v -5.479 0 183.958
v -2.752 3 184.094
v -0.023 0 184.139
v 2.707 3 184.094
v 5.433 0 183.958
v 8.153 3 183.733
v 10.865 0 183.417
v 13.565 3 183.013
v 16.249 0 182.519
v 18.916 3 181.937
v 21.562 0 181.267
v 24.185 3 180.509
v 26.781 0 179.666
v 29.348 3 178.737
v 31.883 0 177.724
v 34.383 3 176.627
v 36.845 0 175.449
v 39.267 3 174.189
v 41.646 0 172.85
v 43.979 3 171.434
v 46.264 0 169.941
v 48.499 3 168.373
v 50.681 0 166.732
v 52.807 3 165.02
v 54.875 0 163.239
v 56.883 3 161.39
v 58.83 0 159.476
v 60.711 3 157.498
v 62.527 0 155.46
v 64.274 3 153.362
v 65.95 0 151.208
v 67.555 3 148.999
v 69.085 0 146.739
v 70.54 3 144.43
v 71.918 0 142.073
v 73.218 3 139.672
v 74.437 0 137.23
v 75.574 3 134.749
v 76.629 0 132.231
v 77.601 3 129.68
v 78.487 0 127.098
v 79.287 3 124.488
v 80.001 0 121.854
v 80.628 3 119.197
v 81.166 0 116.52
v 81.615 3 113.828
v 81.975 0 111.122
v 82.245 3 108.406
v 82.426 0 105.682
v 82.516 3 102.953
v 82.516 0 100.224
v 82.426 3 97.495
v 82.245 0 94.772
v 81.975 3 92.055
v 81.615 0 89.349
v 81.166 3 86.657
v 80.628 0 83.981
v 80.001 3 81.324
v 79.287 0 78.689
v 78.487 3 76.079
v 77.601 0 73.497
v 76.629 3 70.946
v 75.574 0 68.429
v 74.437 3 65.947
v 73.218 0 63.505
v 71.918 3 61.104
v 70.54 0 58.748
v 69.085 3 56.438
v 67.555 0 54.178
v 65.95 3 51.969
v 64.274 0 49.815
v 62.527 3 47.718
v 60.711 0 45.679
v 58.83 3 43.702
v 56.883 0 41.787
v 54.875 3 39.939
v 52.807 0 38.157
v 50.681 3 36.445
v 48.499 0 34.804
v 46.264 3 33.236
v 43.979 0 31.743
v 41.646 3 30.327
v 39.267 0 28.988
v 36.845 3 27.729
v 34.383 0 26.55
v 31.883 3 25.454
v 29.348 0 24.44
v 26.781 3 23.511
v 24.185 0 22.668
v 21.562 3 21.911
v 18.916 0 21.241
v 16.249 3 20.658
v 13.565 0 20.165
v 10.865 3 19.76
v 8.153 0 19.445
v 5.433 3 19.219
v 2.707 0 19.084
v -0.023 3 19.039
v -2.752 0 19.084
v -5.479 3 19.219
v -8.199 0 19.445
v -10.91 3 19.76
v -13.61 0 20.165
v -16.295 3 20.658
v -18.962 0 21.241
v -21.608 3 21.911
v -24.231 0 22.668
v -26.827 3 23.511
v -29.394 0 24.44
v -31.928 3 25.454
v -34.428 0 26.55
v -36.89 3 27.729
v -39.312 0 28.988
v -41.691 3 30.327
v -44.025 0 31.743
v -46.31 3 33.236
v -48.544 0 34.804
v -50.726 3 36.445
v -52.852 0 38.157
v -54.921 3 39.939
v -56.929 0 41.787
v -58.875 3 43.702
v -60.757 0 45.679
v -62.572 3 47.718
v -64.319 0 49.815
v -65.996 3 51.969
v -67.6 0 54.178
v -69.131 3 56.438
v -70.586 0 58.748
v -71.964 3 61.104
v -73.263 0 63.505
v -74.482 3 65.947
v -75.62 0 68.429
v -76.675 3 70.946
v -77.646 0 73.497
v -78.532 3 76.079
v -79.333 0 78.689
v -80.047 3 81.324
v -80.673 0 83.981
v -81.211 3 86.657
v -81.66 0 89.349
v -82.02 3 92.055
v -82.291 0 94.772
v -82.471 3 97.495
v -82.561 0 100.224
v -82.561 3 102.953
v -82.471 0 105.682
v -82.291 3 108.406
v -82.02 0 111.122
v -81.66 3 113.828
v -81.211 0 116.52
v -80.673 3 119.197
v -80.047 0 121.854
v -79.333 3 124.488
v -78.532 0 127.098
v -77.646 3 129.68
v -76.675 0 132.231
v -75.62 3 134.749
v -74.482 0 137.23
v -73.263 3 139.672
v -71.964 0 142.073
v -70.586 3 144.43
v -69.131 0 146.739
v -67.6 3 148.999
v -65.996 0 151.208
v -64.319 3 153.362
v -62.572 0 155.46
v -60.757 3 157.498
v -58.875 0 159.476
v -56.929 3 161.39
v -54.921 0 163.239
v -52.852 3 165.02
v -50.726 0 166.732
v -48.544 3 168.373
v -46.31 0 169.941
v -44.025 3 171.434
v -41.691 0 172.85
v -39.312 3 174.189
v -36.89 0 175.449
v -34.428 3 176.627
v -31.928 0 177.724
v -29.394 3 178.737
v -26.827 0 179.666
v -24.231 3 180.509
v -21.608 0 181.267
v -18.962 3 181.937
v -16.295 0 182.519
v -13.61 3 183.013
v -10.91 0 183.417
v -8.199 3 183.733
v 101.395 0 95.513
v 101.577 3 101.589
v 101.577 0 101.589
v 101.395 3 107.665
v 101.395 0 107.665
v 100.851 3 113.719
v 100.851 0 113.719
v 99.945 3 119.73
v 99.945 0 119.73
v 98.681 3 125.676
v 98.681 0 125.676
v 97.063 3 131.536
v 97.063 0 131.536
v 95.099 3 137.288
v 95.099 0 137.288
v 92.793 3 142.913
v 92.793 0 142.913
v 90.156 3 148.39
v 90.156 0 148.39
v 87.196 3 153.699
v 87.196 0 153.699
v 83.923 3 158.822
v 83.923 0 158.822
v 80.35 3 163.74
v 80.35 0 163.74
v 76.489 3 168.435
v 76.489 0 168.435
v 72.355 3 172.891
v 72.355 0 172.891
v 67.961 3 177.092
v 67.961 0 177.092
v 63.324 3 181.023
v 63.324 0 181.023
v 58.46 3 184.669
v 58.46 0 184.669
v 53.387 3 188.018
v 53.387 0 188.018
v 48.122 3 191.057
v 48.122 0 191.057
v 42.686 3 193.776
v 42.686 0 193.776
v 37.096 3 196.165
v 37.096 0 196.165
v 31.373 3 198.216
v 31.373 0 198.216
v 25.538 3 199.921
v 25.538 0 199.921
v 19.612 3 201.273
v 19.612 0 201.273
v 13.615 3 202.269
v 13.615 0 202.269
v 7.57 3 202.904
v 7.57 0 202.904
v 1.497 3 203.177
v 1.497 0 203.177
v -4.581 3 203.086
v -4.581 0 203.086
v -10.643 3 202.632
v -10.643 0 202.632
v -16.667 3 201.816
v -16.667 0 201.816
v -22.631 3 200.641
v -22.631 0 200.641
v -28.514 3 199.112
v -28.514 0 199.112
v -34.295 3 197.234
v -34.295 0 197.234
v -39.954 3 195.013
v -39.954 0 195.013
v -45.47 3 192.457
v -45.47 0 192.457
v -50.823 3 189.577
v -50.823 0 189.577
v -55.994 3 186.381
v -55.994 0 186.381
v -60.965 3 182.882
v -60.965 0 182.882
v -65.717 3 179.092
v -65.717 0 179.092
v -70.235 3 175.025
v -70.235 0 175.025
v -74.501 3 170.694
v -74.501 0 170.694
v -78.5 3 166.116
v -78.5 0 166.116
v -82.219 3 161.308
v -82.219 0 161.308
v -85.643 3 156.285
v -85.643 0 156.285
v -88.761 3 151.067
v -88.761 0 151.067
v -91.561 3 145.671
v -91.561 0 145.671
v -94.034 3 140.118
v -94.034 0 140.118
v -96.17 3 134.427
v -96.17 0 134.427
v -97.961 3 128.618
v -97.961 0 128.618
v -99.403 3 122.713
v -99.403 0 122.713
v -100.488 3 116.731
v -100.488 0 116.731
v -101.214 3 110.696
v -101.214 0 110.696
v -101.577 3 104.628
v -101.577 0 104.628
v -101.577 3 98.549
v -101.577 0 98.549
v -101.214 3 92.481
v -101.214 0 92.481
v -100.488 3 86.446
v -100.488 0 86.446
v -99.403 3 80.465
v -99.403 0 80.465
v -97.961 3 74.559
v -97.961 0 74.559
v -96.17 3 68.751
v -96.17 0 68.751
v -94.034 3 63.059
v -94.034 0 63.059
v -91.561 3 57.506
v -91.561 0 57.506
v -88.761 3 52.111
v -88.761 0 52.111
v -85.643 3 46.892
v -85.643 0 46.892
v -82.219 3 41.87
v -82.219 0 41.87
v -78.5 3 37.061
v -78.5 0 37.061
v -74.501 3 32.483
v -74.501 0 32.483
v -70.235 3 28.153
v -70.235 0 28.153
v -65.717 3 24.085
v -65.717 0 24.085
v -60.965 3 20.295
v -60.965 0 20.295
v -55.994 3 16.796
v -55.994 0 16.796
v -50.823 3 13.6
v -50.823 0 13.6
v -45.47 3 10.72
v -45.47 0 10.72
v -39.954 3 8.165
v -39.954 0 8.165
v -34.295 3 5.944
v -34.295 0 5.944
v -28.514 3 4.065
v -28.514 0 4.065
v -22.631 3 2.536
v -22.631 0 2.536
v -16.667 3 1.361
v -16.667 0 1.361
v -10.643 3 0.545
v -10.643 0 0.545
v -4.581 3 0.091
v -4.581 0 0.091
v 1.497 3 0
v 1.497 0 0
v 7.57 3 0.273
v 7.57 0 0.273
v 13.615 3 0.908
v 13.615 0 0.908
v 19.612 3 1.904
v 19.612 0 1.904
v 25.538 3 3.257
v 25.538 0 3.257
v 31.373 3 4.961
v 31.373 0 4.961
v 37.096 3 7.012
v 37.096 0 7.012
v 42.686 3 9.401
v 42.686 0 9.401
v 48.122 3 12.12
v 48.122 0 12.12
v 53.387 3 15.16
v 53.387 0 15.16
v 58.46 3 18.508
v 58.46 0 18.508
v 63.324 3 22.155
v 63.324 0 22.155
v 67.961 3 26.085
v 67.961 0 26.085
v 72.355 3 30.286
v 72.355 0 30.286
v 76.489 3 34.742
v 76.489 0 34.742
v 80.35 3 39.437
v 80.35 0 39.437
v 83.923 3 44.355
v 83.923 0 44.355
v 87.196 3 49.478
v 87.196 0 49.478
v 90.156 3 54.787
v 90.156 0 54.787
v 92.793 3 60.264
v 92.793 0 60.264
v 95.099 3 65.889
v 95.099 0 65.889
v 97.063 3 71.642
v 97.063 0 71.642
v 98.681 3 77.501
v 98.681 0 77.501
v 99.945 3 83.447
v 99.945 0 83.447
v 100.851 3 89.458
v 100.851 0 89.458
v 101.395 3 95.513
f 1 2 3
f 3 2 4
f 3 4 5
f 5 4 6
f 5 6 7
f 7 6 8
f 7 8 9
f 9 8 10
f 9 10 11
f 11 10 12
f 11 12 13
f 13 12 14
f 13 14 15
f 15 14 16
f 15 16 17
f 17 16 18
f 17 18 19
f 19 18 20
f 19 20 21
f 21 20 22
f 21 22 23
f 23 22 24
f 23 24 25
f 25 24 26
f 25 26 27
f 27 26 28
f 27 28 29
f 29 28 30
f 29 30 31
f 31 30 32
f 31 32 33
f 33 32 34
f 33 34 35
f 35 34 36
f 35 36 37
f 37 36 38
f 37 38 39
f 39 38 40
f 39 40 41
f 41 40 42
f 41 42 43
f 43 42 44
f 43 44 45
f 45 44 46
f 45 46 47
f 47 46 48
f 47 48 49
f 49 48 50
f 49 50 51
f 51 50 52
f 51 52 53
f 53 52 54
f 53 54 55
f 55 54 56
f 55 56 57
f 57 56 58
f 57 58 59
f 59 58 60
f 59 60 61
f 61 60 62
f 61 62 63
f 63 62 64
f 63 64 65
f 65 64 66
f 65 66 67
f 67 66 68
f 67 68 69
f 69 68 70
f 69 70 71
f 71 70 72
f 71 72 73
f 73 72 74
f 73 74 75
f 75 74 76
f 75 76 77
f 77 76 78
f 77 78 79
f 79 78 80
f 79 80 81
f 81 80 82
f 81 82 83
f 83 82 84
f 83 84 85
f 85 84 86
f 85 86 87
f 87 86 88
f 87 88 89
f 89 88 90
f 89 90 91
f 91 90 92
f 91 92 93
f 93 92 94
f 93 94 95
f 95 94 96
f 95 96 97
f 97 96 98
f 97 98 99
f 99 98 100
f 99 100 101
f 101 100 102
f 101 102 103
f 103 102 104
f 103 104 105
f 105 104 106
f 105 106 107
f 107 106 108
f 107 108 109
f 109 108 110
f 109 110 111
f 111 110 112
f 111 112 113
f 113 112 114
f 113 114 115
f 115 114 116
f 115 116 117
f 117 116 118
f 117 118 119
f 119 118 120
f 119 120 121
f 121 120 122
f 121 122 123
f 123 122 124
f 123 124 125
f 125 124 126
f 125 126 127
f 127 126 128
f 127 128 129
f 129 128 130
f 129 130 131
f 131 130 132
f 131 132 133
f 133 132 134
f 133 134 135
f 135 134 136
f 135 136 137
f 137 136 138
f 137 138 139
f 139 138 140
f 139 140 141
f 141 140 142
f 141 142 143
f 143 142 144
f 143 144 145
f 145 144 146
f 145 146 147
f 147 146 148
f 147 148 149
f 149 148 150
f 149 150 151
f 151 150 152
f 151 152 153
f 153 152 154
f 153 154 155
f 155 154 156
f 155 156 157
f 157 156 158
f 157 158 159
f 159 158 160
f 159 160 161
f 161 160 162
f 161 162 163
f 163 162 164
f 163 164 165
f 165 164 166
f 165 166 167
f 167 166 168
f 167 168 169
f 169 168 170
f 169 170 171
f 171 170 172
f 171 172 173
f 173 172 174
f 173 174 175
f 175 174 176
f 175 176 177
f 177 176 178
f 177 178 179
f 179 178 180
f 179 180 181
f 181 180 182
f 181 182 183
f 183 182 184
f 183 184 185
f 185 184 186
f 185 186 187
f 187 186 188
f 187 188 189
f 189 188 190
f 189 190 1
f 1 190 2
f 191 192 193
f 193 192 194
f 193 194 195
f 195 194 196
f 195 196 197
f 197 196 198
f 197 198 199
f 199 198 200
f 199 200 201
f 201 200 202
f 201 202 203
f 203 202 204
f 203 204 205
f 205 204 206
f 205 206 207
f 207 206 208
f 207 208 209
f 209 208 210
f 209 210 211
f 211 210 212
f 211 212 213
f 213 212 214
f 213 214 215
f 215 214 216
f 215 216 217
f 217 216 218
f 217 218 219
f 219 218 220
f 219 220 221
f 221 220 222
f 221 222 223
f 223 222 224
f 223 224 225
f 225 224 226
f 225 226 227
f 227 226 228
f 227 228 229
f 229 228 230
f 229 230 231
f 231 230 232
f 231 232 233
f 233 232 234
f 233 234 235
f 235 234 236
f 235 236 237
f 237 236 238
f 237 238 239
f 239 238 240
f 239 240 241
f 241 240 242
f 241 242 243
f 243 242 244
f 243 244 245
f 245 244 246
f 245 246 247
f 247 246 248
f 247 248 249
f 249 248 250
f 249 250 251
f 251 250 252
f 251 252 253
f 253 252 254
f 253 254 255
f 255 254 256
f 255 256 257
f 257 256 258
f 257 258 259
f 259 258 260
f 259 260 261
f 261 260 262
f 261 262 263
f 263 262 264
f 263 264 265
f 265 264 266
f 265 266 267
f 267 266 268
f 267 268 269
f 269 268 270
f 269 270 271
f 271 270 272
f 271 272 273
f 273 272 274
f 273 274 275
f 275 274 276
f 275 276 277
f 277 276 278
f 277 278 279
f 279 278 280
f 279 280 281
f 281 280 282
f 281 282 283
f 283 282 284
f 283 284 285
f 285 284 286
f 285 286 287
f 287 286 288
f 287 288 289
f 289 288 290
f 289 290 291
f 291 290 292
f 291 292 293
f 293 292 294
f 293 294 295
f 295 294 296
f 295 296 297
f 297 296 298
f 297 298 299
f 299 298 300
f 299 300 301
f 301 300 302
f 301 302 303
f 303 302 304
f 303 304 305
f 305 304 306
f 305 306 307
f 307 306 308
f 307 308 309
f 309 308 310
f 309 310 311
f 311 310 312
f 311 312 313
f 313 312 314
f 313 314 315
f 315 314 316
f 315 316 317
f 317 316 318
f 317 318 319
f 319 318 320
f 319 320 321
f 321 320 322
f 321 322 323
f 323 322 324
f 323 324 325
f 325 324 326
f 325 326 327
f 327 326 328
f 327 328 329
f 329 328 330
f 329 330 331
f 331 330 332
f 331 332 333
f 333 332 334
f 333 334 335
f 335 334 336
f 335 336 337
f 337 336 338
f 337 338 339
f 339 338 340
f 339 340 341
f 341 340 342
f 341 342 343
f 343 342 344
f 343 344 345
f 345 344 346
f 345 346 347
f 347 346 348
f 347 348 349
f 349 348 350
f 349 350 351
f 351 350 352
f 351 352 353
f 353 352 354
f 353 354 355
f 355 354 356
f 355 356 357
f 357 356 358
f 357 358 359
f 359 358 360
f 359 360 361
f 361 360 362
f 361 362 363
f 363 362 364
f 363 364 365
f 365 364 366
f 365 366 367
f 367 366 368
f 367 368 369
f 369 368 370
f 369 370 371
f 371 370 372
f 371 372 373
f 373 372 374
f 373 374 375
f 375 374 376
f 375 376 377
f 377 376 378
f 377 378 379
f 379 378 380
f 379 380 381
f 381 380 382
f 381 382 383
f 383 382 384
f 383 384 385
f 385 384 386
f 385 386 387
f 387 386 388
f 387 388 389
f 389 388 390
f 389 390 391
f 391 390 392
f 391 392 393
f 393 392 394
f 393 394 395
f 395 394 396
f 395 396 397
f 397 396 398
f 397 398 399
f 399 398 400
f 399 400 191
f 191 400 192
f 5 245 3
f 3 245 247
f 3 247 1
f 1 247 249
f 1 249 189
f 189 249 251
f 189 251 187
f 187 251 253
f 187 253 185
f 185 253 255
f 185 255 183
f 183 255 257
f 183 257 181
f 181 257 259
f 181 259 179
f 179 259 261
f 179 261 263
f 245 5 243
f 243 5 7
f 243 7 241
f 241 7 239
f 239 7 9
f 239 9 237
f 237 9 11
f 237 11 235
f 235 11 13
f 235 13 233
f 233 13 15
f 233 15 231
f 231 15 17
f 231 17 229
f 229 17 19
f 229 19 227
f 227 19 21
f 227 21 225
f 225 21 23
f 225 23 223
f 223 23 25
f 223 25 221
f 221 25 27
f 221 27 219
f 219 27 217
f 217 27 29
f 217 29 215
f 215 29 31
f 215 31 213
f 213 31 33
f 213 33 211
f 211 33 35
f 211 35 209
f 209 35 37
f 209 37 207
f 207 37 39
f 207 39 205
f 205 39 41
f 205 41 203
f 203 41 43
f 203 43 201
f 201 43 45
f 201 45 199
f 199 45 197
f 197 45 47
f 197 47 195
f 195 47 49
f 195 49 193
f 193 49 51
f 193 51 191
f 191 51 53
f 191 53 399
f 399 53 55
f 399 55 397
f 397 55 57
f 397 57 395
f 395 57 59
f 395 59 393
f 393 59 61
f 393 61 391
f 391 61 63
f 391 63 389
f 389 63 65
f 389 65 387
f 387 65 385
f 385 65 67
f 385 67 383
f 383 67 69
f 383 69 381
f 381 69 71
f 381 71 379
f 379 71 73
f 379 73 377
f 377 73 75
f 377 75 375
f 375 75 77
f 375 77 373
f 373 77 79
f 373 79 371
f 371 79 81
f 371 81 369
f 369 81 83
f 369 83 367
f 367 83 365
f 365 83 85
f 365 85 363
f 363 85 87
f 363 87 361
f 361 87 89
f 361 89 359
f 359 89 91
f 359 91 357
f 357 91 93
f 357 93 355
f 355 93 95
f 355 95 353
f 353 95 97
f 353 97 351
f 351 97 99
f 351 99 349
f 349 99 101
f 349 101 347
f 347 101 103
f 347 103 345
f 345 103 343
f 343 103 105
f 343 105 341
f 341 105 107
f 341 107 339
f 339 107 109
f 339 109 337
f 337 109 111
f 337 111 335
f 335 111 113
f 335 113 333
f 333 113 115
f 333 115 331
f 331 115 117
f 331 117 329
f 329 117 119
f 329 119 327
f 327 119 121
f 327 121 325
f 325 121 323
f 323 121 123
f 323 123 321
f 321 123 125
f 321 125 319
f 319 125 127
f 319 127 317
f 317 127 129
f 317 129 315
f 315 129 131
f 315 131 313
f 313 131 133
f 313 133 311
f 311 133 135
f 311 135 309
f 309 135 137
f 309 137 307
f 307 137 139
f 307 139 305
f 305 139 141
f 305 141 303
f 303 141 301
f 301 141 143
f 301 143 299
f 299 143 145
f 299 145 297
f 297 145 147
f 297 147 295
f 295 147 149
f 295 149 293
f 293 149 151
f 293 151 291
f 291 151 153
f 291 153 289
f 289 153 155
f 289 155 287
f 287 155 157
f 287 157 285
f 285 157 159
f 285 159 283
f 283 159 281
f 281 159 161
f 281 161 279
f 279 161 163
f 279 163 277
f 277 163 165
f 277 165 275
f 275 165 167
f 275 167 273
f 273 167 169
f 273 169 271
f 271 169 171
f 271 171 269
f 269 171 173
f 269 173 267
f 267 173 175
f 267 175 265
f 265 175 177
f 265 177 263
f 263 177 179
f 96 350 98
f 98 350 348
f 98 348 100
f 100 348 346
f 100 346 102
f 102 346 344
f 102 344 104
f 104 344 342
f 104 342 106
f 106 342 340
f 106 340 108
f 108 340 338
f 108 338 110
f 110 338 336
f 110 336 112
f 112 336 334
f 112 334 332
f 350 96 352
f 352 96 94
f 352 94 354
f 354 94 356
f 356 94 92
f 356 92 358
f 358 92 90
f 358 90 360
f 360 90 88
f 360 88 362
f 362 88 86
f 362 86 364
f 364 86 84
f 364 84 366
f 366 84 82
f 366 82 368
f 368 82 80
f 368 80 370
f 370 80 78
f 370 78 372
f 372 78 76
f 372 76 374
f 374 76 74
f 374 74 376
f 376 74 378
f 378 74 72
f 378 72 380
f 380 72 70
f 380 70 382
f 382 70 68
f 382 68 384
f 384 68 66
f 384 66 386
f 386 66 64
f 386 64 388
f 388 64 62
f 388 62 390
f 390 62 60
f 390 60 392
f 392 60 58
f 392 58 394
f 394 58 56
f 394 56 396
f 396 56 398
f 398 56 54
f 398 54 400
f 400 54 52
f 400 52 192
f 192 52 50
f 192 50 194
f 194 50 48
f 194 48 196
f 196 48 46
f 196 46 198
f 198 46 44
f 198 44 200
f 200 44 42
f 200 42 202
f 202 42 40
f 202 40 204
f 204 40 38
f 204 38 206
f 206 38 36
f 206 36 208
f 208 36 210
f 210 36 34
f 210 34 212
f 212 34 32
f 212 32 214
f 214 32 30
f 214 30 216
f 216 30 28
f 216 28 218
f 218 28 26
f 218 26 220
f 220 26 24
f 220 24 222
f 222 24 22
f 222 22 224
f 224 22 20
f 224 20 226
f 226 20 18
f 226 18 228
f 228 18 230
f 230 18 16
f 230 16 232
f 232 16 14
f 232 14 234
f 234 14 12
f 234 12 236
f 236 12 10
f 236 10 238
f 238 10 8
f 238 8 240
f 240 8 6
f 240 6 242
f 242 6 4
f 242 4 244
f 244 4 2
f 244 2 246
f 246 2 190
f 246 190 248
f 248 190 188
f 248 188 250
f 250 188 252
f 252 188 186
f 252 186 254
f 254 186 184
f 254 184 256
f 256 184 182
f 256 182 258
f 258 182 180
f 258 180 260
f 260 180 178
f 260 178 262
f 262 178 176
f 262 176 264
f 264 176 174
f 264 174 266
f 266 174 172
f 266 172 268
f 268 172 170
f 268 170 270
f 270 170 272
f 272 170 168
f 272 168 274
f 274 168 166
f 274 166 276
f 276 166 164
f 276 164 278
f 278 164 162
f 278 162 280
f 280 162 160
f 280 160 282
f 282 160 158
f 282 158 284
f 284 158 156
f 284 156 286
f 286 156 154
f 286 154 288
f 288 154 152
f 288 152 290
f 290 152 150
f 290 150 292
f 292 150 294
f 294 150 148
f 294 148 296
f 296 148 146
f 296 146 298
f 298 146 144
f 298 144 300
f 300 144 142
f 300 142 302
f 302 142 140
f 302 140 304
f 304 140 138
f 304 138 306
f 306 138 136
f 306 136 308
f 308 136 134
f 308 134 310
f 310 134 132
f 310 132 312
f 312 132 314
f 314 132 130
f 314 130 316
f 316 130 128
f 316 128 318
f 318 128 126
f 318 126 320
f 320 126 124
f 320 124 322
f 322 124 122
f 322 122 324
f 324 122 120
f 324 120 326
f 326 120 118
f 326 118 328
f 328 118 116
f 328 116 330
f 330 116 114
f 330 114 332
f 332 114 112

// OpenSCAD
module stlObject1() {polyhedron(
 points=[
   [-0.0227356,0,184.1386],
   [-2.752117,3,184.0935],
   [-5.478513,0,183.9581],
   [2.706645,3,184.0935],
   [5.433042,0,183.9581],
   [8.153473,3,183.7327],
   [10.86496,0,183.4175],
   [13.56455,3,183.0128],
   [16.24928,0,182.519],
   [18.91621,3,181.9367],
   [21.56243,0,181.2666],
   [24.18505,3,180.5094],
   [26.78121,0,179.6658],
   [29.34805,3,178.7369],
   [31.88277,0,177.7236],
   [34.38261,3,176.6271],
   [36.84482,0,175.4485],
   [39.26672,3,174.1892],
   [41.64566,0,172.8505],
   [43.97903,3,171.4338],
   [46.26429,0,169.9408],
   [48.49894,3,168.373],
   [50.68052,0,166.7322],
   [52.80667,3,165.0201],
   [54.87504,0,163.2387],
   [56.88339,3,161.3899],
   [58.82951,0,159.4757],
   [60.71127,3,157.4982],
   [62.52663,0,155.4596],
   [64.27358,3,153.362],
   [65.95023,0,151.2079],
   [67.55474,3,148.9995],
   [69.08536,0,146.7392],
   [70.54041,3,144.4296],
   [71.91829,0,142.0731],
   [73.21751,3,139.6723],
   [74.43664,0,137.23],
   [75.57436,3,134.7486],
   [76.6294,0,132.231],
   [77.60063,3,129.6798],
   [78.48698,0,127.098],
   [79.28748,3,124.4882],
   [80.00126,0,121.8535],
   [80.62753,3,119.1965],
   [81.16561,0,116.5203],
   [81.61491,3,113.8278],
   [81.97495,0,111.1219],
   [82.24532,3,108.4056],
   [82.42573,0,105.6818],
   [82.51598,3,102.9535],
   [82.51598,0,100.2238],
   [82.42573,3,97.49549],
   [82.24532,0,94.77171],
   [81.97495,3,92.05537],
   [81.61491,0,89.34947],
   [81.16561,3,86.65694],
   [80.62753,0,83.98075],
   [80.00126,3,81.3238],
   [79.28748,0,78.68902],
   [78.48698,3,76.07928],
   [77.60063,0,73.49743],
   [76.6294,3,70.9463],
   [75.57436,0,68.42867],
   [74.43664,3,65.94731],
   [73.21751,0,63.50492],
   [71.91829,3,61.10417],
   [70.54041,0,58.74769],
   [69.08536,3,56.43806],
   [67.55474,0,54.1778],
   [65.95023,3,51.96938],
   [64.27358,0,49.81522],
   [62.52663,3,47.71767],
   [60.71127,0,45.67904],
   [58.82951,3,43.70153],
   [56.88339,0,41.78733],
   [54.87504,3,39.93852],
   [52.80667,0,38.15712],
   [50.68052,3,36.44508],
   [48.49894,0,34.80428],
   [46.26429,3,33.2365],
   [43.97903,0,31.74347],
   [41.64566,3,30.32681],
   [39.26672,0,28.98808],
   [36.84482,3,27.72872],
   [34.38261,0,26.55014],
   [31.88277,3,25.45361],
   [29.34805,0,24.44033],
   [26.78121,3,23.51141],
   [24.18505,0,22.66788],
   [21.56243,3,21.91064],
   [18.91621,0,21.24052],
   [16.24928,3,20.65826],
   [13.56455,0,20.16451],
   [10.86496,3,19.75978],
   [8.153473,0,19.44453],
   [5.433042,3,19.21912],
   [2.706645,0,19.08376],
   [-0.0227356,3,19.03863],
   [-2.752117,0,19.08376],
   [-5.478513,3,19.21912],
   [-8.198944,0,19.44453],
   [-10.91043,3,19.75978],
   [-13.61002,0,20.16451],
   [-16.29475,3,20.65826],
   [-18.96168,0,21.24052],
   [-21.6079,3,21.91064],
   [-24.23053,0,22.66788],
   [-26.82668,3,23.51141],
   [-29.39352,0,24.44033],
   [-31.92824,3,25.45361],
   [-34.42808,0,26.55014],
   [-36.89029,3,27.72872],
   [-39.31219,0,28.98808],
   [-41.69113,3,30.32681],
   [-44.02451,0,31.74347],
   [-46.30976,3,33.2365],
   [-48.54441,0,34.80428],
   [-50.72599,3,36.44508],
   [-52.85214,0,38.15712],
   [-54.92051,3,39.93852],
   [-56.92886,0,41.78733],
   [-58.87498,3,43.70153],
   [-60.75674,0,45.67904],
   [-62.5721,3,47.71767],
   [-64.31905,0,49.81522],
   [-65.9957,3,51.96938],
   [-67.60021,0,54.1778],
   [-69.13083,3,56.43806],
   [-70.58588,0,58.74769],
   [-71.96376,3,61.10417],
   [-73.26298,0,63.50492],
   [-74.48211,3,65.94731],
   [-75.61983,0,68.42867],
   [-76.67487,3,70.9463],
   [-77.6461,0,73.49743],
   [-78.53245,3,76.07928],
   [-79.33295,0,78.68902],
   [-80.04673,3,81.3238],
   [-80.673,0,83.98075],
   [-81.21108,3,86.65694],
   [-81.66039,0,89.34947],
   [-82.02042,3,92.05537],
   [-82.29079,0,94.77171],
   [-82.4712,3,97.49549],
   [-82.56145,0,100.2238],
   [-82.56145,3,102.9535],
   [-82.4712,0,105.6818],
   [-82.29079,3,108.4056],
   [-82.02042,0,111.1219],
   [-81.66039,3,113.8278],
   [-81.21108,0,116.5203],
   [-80.673,3,119.1965],
   [-80.04673,0,121.8535],
   [-79.33295,3,124.4882],
   [-78.53245,0,127.098],
   [-77.6461,3,129.6798],
   [-76.67487,0,132.231],
   [-75.61983,3,134.7486],
   [-74.48211,0,137.23],
   [-73.26298,3,139.6723],
   [-71.96376,0,142.0731],
   [-70.58588,3,144.4296],
   [-69.13083,0,146.7392],
   [-67.60021,3,148.9995],
   [-65.9957,0,151.2079],
   [-64.31905,3,153.362],
   [-62.5721,0,155.4596],
   [-60.75674,3,157.4982],
   [-58.87498,0,159.4757],
   [-56.92886,3,161.3899],
   [-54.92051,0,163.2387],
   [-52.85214,3,165.0201],
   [-50.72599,0,166.7322],
   [-48.54441,3,168.373],
   [-46.30976,0,169.9408],
   [-44.02451,3,171.4338],
   [-41.69113,0,172.8505],
   [-39.31219,3,174.1892],
   [-36.89029,0,175.4485],
   [-34.42808,3,176.6271],
   [-31.92824,0,177.7236],
   [-29.39352,3,178.7369],
   [-26.82668,0,179.6658],
   [-24.23053,3,180.5094],
   [-21.6079,0,181.2666],
   [-18.96168,3,181.9367],
   [-16.29475,0,182.519],
   [-13.61002,3,183.0128],
   [-10.91043,0,183.4175],
   [-8.198944,3,183.7327],
   [101.5773,0,101.5886],
   [101.5773,3,101.5886],
   [101.3954,0,95.51253],
   [101.3954,3,107.6647],
   [101.3954,0,107.6647],
   [100.8505,3,113.7191],
   [100.8505,0,113.7191],
   [99.94451,3,119.73],
   [99.94451,0,119.73],
   [98.68065,3,125.676],
   [98.68065,0,125.676],
   [97.06346,3,131.5358],
   [97.06346,0,131.5358],
   [95.09872,3,137.2883],
   [95.09872,0,137.2883],
   [92.79348,3,142.9131],
   [92.79348,0,142.9131],
   [90.15598,3,148.3899],
   [90.15598,0,148.3899],
   [87.19566,3,153.6992],
   [87.19566,0,153.6992],
   [83.92313,3,158.8219],
   [83.92313,0,158.8219],
   [80.35008,3,163.7398],
   [80.35008,0,163.7398],
   [76.48933,3,168.4352],
   [76.48933,0,168.4352],
   [72.35468,3,172.8913],
   [72.35468,0,172.8913],
   [67.96094,3,177.0921],
   [67.96094,0,177.0921],
   [63.32383,3,181.0227],
   [63.32383,0,181.0227],
   [58.45996,3,184.6689],
   [58.45996,0,184.6689],
   [53.38673,3,188.0177],
   [53.38673,0,188.0177],
   [48.12232,3,191.0571],
   [48.12232,0,191.0571],
   [42.68556,3,193.7763],
   [42.68556,0,193.7763],
   [37.09591,3,196.1654],
   [37.09591,0,196.1654],
   [31.37339,3,198.216],
   [31.37339,0,198.216],
   [25.53848,3,199.9206],
   [25.53848,0,199.9206],
   [19.61207,3,201.2733],
   [19.61207,0,201.2733],
   [13.61536,3,202.2691],
   [13.61536,0,202.2691],
   [7.569842,3,202.9045],
   [7.569842,0,202.9045],
   [1.49714,3,203.1773],
   [1.49714,0,203.1773],
   [-4.581002,3,203.0863],
   [-4.581002,0,203.0863],
   [-10.64283,3,202.6321],
   [-10.64283,0,202.6321],
   [-16.66664,3,201.8161],
   [-16.66664,0,201.8161],
   [-22.63086,3,200.6413],
   [-22.63086,0,200.6413],
   [-28.51416,3,199.112],
   [-28.51416,0,199.112],
   [-34.29546,3,197.2335],
   [-34.29546,0,197.2335],
   [-39.95408,3,195.0126],
   [-39.95408,0,195.0126],
   [-45.46975,3,192.4574],
   [-45.46975,0,192.4574],
   [-50.82273,3,189.5768],
   [-50.82273,0,189.5768],
   [-55.99387,3,186.3813],
   [-55.99387,0,186.3813],
   [-60.96464,3,182.8822],
   [-60.96464,0,182.8822],
   [-65.71725,3,179.0921],
   [-65.71725,0,179.0921],
   [-70.2347,3,175.0246],
   [-70.2347,0,175.0246],
   [-74.50081,3,170.6942],
   [-74.50081,0,170.6942],
   [-78.5003,3,166.1164],
   [-78.5003,0,166.1164],
   [-82.21886,3,161.3076],
   [-82.21886,0,161.3076],
   [-85.64319,3,156.2851],
   [-85.64319,0,156.2851],
   [-88.76101,3,151.0667],
   [-88.76101,0,151.0667],
   [-91.56117,3,145.6712],
   [-91.56117,0,145.6712],
   [-94.03365,3,140.1179],
   [-94.03365,0,140.1179],
   [-96.1696,3,134.4267],
   [-96.1696,0,134.4267],
   [-97.96136,3,128.618],
   [-97.96136,0,128.618],
   [-99.40253,3,122.7125],
   [-99.40253,0,122.7125],
   [-100.4879,3,116.7313],
   [-100.4879,0,116.7313],
   [-101.2137,3,110.696],
   [-101.2137,0,110.696],
   [-101.5773,3,104.628],
   [-101.5773,0,104.628],
   [-101.5773,3,98.54922],
   [-101.5773,0,98.54922],
   [-101.2137,3,92.48128],
   [-101.2137,0,92.48128],
   [-100.4879,3,86.44594],
   [-100.4879,0,86.44594],
   [-99.40253,3,80.4648],
   [-99.40253,0,80.4648],
   [-97.96136,3,74.55929],
   [-97.96136,0,74.55929],
   [-96.1696,3,68.75053],
   [-96.1696,0,68.75053],
   [-94.03365,3,63.05932],
   [-94.03365,0,63.05932],
   [-91.56117,3,57.50604],
   [-91.56117,0,57.50604],
   [-88.76101,3,52.11057],
   [-88.76101,0,52.11057],
   [-85.64319,3,46.89221],
   [-85.64319,0,46.89221],
   [-82.21886,3,41.86965],
   [-82.21886,0,41.86965],
   [-78.5003,3,37.06087],
   [-78.5003,0,37.06087],
   [-74.50081,3,32.48308],
   [-74.50081,0,32.48308],
   [-70.2347,3,28.15267],
   [-70.2347,0,28.15267],
   [-65.71725,3,24.08514],
   [-65.71725,0,24.08514],
   [-60.96464,3,20.29506],
   [-60.96464,0,20.29506],
   [-55.99387,3,16.79599],
   [-55.99387,0,16.79599],
   [-50.82273,3,13.60045],
   [-50.82273,0,13.60045],
   [-45.46975,3,10.71989],
   [-45.46975,0,10.71989],
   [-39.95408,3,8.164612],
   [-39.95408,0,8.164612],
   [-34.29546,3,5.943764],
   [-34.29546,0,5.943764],
   [-28.51416,3,4.065308],
   [-28.51416,0,4.065308],
   [-22.63086,3,2.535957],
   [-22.63086,0,2.535957],
   [-16.66664,3,1.361183],
   [-16.66664,0,1.361183],
   [-10.64283,3,0.5452042],
   [-10.64283,0,0.5452042],
   [-4.581002,3,0.09093475],
   [-4.581002,0,0.09093475],
   [1.49714,3,0],
   [1.49714,0,0],
   [7.569842,3,0.272728],
   [7.569842,0,0.272728],
   [13.61536,3,0.9081345],
   [13.61536,0,0.9081345],
   [19.61207,3,1.903954],
   [19.61207,0,1.903954],
   [25.53848,3,3.256622],
   [25.53848,0,3.256622],
   [31.37339,3,4.961288],
   [31.37339,0,4.961288],
   [37.09591,3,7.011856],
   [37.09591,0,7.011856],
   [42.68556,3,9.400986],
   [42.68556,0,9.400986],
   [48.12232,3,12.12012],
   [48.12232,0,12.12012],
   [53.38673,3,15.15954],
   [53.38673,0,15.15954],
   [58.45996,3,18.50834],
   [58.45996,0,18.50834],
   [63.32383,3,22.15455],
   [63.32383,0,22.15455],
   [67.96094,3,26.08511],
   [67.96094,0,26.08511],
   [72.35468,3,30.28596],
   [72.35468,0,30.28596],
   [76.48933,3,34.74206],
   [76.48933,0,34.74206],
   [80.35008,3,39.43744],
   [80.35008,0,39.43744],
   [83.92313,3,44.35531],
   [83.92313,0,44.35531],
   [87.19566,3,49.47807],
   [87.19566,0,49.47807],
   [90.15598,3,54.78736],
   [90.15598,0,54.78736],
   [92.79348,3,60.26419],
   [92.79348,0,60.26419],
   [95.09872,3,65.88895],
   [95.09872,0,65.88895],
   [97.06346,3,71.6415],
   [97.06346,0,71.6415],
   [98.68065,3,77.50126],
   [98.68065,0,77.50126],
   [99.94451,3,83.44725],
   [99.94451,0,83.44725],
   [100.8505,3,89.45818],
   [100.8505,0,89.45818],
   [101.3954,3,95.51253],
 ],
 faces=[
  [0,1,2,],
  [3,1,0,],
  [4,3,0,],
  [5,3,4,],
  [6,5,4,],
  [7,5,6,],
  [8,7,6,],
  [9,7,8,],
  [10,9,8,],
  [11,9,10,],
  [12,11,10,],
  [13,11,12,],
  [14,13,12,],
  [15,13,14,],
  [16,15,14,],
  [17,15,16,],
  [18,17,16,],
  [19,17,18,],
  [20,19,18,],
  [21,19,20,],
  [22,21,20,],
  [23,21,22,],
  [24,23,22,],
  [25,23,24,],
  [26,25,24,],
  [27,25,26,],
  [28,27,26,],
  [29,27,28,],
  [30,29,28,],
  [31,29,30,],
  [32,31,30,],
  [33,31,32,],
  [34,33,32,],
  [35,33,34,],
  [36,35,34,],
  [37,35,36,],
  [38,37,36,],
  [39,37,38,],
  [40,39,38,],
  [41,39,40,],
  [42,41,40,],
  [43,41,42,],
  [44,43,42,],
  [45,43,44,],
  [46,45,44,],
  [47,45,46,],
  [48,47,46,],
  [49,47,48,],
  [50,49,48,],
  [51,49,50,],
  [52,51,50,],
  [53,51,52,],
  [54,53,52,],
  [55,53,54,],
  [56,55,54,],
  [57,55,56,],
  [58,57,56,],
  [59,57,58,],
  [60,59,58,],
  [61,59,60,],
  [62,61,60,],
  [63,61,62,],
  [64,63,62,],
  [65,63,64,],
  [66,65,64,],
  [67,65,66,],
  [68,67,66,],
  [69,67,68,],
  [70,69,68,],
  [71,69,70,],
  [72,71,70,],
  [73,71,72,],
  [74,73,72,],
  [75,73,74,],
  [76,75,74,],
  [77,75,76,],
  [78,77,76,],
  [79,77,78,],
  [80,79,78,],
  [81,79,80,],
  [82,81,80,],
  [83,81,82,],
  [84,83,82,],
  [85,83,84,],
  [86,85,84,],
  [87,85,86,],
  [88,87,86,],
  [89,87,88,],
  [90,89,88,],
  [91,89,90,],
  [92,91,90,],
  [93,91,92,],
  [94,93,92,],
  [95,93,94,],
  [96,95,94,],
  [97,95,96,],
  [98,97,96,],
  [99,97,98,],
  [100,99,98,],
  [101,99,100,],
  [102,101,100,],
  [103,101,102,],
  [104,103,102,],
  [105,103,104,],
  [106,105,104,],
  [107,105,106,],
  [108,107,106,],
  [109,107,108,],
  [110,109,108,],
  [111,109,110,],
  [112,111,110,],
  [113,111,112,],
  [114,113,112,],
  [115,113,114,],
  [116,115,114,],
  [117,115,116,],
  [118,117,116,],
  [119,117,118,],
  [120,119,118,],
  [121,119,120,],
  [122,121,120,],
  [123,121,122,],
  [124,123,122,],
  [125,123,124,],
  [126,125,124,],
  [127,125,126,],
  [128,127,126,],
  [129,127,128,],
  [130,129,128,],
  [131,129,130,],
  [132,131,130,],
  [133,131,132,],
  [134,133,132,],
  [135,133,134,],
  [136,135,134,],
  [137,135,136,],
  [138,137,136,],
  [139,137,138,],
  [140,139,138,],
  [141,139,140,],
  [142,141,140,],
  [143,141,142,],
  [144,143,142,],
  [145,143,144,],
  [146,145,144,],
  [147,145,146,],
  [148,147,146,],
  [149,147,148,],
  [150,149,148,],
  [151,149,150,],
  [152,151,150,],
  [153,151,152,],
  [154,153,152,],
  [155,153,154,],
  [156,155,154,],
  [157,155,156,],
  [158,157,156,],
  [159,157,158,],
  [160,159,158,],
  [161,159,160,],
  [162,161,160,],
  [163,161,162,],
  [164,163,162,],
  [165,163,164,],
  [166,165,164,],
  [167,165,166,],
  [168,167,166,],
  [169,167,168,],
  [170,169,168,],
  [171,169,170,],
  [172,171,170,],
  [173,171,172,],
  [174,173,172,],
  [175,173,174,],
  [176,175,174,],
  [177,175,176,],
  [178,177,176,],
  [179,177,178,],
  [180,179,178,],
  [181,179,180,],
  [182,181,180,],
  [183,181,182,],
  [184,183,182,],
  [185,183,184,],
  [186,185,184,],
  [187,185,186,],
  [188,187,186,],
  [189,187,188,],
  [2,189,188,],
  [1,189,2,],
  [190,191,192,],
  [193,191,190,],
  [194,193,190,],
  [195,193,194,],
  [196,195,194,],
  [197,195,196,],
  [198,197,196,],
  [199,197,198,],
  [200,199,198,],
  [201,199,200,],
  [202,201,200,],
  [203,201,202,],
  [204,203,202,],
  [205,203,204,],
  [206,205,204,],
  [207,205,206,],
  [208,207,206,],
  [209,207,208,],
  [210,209,208,],
  [211,209,210,],
  [212,211,210,],
  [213,211,212,],
  [214,213,212,],
  [215,213,214,],
  [216,215,214,],
  [217,215,216,],
  [218,217,216,],
  [219,217,218,],
  [220,219,218,],
  [221,219,220,],
  [222,221,220,],
  [223,221,222,],
  [224,223,222,],
  [225,223,224,],
  [226,225,224,],
  [227,225,226,],
  [228,227,226,],
  [229,227,228,],
  [230,229,228,],
  [231,229,230,],
  [232,231,230,],
  [233,231,232,],
  [234,233,232,],
  [235,233,234,],
  [236,235,234,],
  [237,235,236,],
  [238,237,236,],
  [239,237,238,],
  [240,239,238,],
  [241,239,240,],
  [242,241,240,],
  [243,241,242,],
  [244,243,242,],
  [245,243,244,],
  [246,245,244,],
  [247,245,246,],
  [248,247,246,],
  [249,247,248,],
  [250,249,248,],
  [251,249,250,],
  [252,251,250,],
  [253,251,252,],
  [254,253,252,],
  [255,253,254,],
  [256,255,254,],
  [257,255,256,],
  [258,257,256,],
  [259,257,258,],
  [260,259,258,],
  [261,259,260,],
  [262,261,260,],
  [263,261,262,],
  [264,263,262,],
  [265,263,264,],
  [266,265,264,],
  [267,265,266,],
  [268,267,266,],
  [269,267,268,],
  [270,269,268,],
  [271,269,270,],
  [272,271,270,],
  [273,271,272,],
  [274,273,272,],
  [275,273,274,],
  [276,275,274,],
  [277,275,276,],
  [278,277,276,],
  [279,277,278,],
  [280,279,278,],
  [281,279,280,],
  [282,281,280,],
  [283,281,282,],
  [284,283,282,],
  [285,283,284,],
  [286,285,284,],
  [287,285,286,],
  [288,287,286,],
  [289,287,288,],
  [290,289,288,],
  [291,289,290,],
  [292,291,290,],
  [293,291,292,],
  [294,293,292,],
  [295,293,294,],
  [296,295,294,],
  [297,295,296,],
  [298,297,296,],
  [299,297,298,],
  [300,299,298,],
  [301,299,300,],
  [302,301,300,],
  [303,301,302,],
  [304,303,302,],
  [305,303,304,],
  [306,305,304,],
  [307,305,306,],
  [308,307,306,],
  [309,307,308,],
  [310,309,308,],
  [311,309,310,],
  [312,311,310,],
  [313,311,312,],
  [314,313,312,],
  [315,313,314,],
  [316,315,314,],
  [317,315,316,],
  [318,317,316,],
  [319,317,318,],
  [320,319,318,],
  [321,319,320,],
  [322,321,320,],
  [323,321,322,],
  [324,323,322,],
  [325,323,324,],
  [326,325,324,],
  [327,325,326,],
  [328,327,326,],
  [329,327,328,],
  [330,329,328,],
  [331,329,330,],
  [332,331,330,],
  [333,331,332,],
  [334,333,332,],
  [335,333,334,],
  [336,335,334,],
  [337,335,336,],
  [338,337,336,],
  [339,337,338,],
  [340,339,338,],
  [341,339,340,],
  [342,341,340,],
  [343,341,342,],
  [344,343,342,],
  [345,343,344,],
  [346,345,344,],
  [347,345,346,],
  [348,347,346,],
  [349,347,348,],
  [350,349,348,],
  [351,349,350,],
  [352,351,350,],
  [353,351,352,],
  [354,353,352,],
  [355,353,354,],
  [356,355,354,],
  [357,355,356,],
  [358,357,356,],
  [359,357,358,],
  [360,359,358,],
  [361,359,360,],
  [362,361,360,],
  [363,361,362,],
  [364,363,362,],
  [365,363,364,],
  [366,365,364,],
  [367,365,366,],
  [368,367,366,],
  [369,367,368,],
  [370,369,368,],
  [371,369,370,],
  [372,371,370,],
  [373,371,372,],
  [374,373,372,],
  [375,373,374,],
  [376,375,374,],
  [377,375,376,],
  [378,377,376,],
  [379,377,378,],
  [380,379,378,],
  [381,379,380,],
  [382,381,380,],
  [383,381,382,],
  [384,383,382,],
  [385,383,384,],
  [386,385,384,],
  [387,385,386,],
  [388,387,386,],
  [389,387,388,],
  [390,389,388,],
  [391,389,390,],
  [392,391,390,],
  [393,391,392,],
  [394,393,392,],
  [395,393,394,],
  [396,395,394,],
  [397,395,396,],
  [398,397,396,],
  [399,397,398,],
  [192,399,398,],
  [191,399,192,],
  [0,244,4,],
  [246,244,0,],
  [2,246,0,],
  [248,246,2,],
  [188,248,2,],
  [250,248,188,],
  [186,250,188,],
  [252,250,186,],
  [184,252,186,],
  [254,252,184,],
  [182,254,184,],
  [256,254,182,],
  [180,256,182,],
  [258,256,180,],
  [178,258,180,],
  [260,258,178,],
  [262,260,178,],
  [242,4,244,],
  [6,4,242,],
  [240,6,242,],
  [238,6,240,],
  [8,6,238,],
  [236,8,238,],
  [10,8,236,],
  [234,10,236,],
  [12,10,234,],
  [232,12,234,],
  [14,12,232,],
  [230,14,232,],
  [16,14,230,],
  [228,16,230,],
  [18,16,228,],
  [226,18,228,],
  [20,18,226,],
  [224,20,226,],
  [22,20,224,],
  [222,22,224,],
  [24,22,222,],
  [220,24,222,],
  [26,24,220,],
  [218,26,220,],
  [216,26,218,],
  [28,26,216,],
  [214,28,216,],
  [30,28,214,],
  [212,30,214,],
  [32,30,212,],
  [210,32,212,],
  [34,32,210,],
  [208,34,210,],
  [36,34,208,],
  [206,36,208,],
  [38,36,206,],
  [204,38,206,],
  [40,38,204,],
  [202,40,204,],
  [42,40,202,],
  [200,42,202,],
  [44,42,200,],
  [198,44,200,],
  [196,44,198,],
  [46,44,196,],
  [194,46,196,],
  [48,46,194,],
  [190,48,194,],
  [50,48,190,],
  [192,50,190,],
  [52,50,192,],
  [398,52,192,],
  [54,52,398,],
  [396,54,398,],
  [56,54,396,],
  [394,56,396,],
  [58,56,394,],
  [392,58,394,],
  [60,58,392,],
  [390,60,392,],
  [62,60,390,],
  [388,62,390,],
  [64,62,388,],
  [386,64,388,],
  [384,64,386,],
  [66,64,384,],
  [382,66,384,],
  [68,66,382,],
  [380,68,382,],
  [70,68,380,],
  [378,70,380,],
  [72,70,378,],
  [376,72,378,],
  [74,72,376,],
  [374,74,376,],
  [76,74,374,],
  [372,76,374,],
  [78,76,372,],
  [370,78,372,],
  [80,78,370,],
  [368,80,370,],
  [82,80,368,],
  [366,82,368,],
  [364,82,366,],
  [84,82,364,],
  [362,84,364,],
  [86,84,362,],
  [360,86,362,],
  [88,86,360,],
  [358,88,360,],
  [90,88,358,],
  [356,90,358,],
  [92,90,356,],
  [354,92,356,],
  [94,92,354,],
  [352,94,354,],
  [96,94,352,],
  [350,96,352,],
  [98,96,350,],
  [348,98,350,],
  [100,98,348,],
  [346,100,348,],
  [102,100,346,],
  [344,102,346,],
  [342,102,344,],
  [104,102,342,],
  [340,104,342,],
  [106,104,340,],
  [338,106,340,],
  [108,106,338,],
  [336,108,338,],
  [110,108,336,],
  [334,110,336,],
  [112,110,334,],
  [332,112,334,],
  [114,112,332,],
  [330,114,332,],
  [116,114,330,],
  [328,116,330,],
  [118,116,328,],
  [326,118,328,],
  [120,118,326,],
  [324,120,326,],
  [322,120,324,],
  [122,120,322,],
  [320,122,322,],
  [124,122,320,],
  [318,124,320,],
  [126,124,318,],
  [316,126,318,],
  [128,126,316,],
  [314,128,316,],
  [130,128,314,],
  [312,130,314,],
  [132,130,312,],
  [310,132,312,],
  [134,132,310,],
  [308,134,310,],
  [136,134,308,],
  [306,136,308,],
  [138,136,306,],
  [304,138,306,],
  [140,138,304,],
  [302,140,304,],
  [300,140,302,],
  [142,140,300,],
  [298,142,300,],
  [144,142,298,],
  [296,144,298,],
  [146,144,296,],
  [294,146,296,],
  [148,146,294,],
  [292,148,294,],
  [150,148,292,],
  [290,150,292,],
  [152,150,290,],
  [288,152,290,],
  [154,152,288,],
  [286,154,288,],
  [156,154,286,],
  [284,156,286,],
  [158,156,284,],
  [282,158,284,],
  [280,158,282,],
  [160,158,280,],
  [278,160,280,],
  [162,160,278,],
  [276,162,278,],
  [164,162,276,],
  [274,164,276,],
  [166,164,274,],
  [272,166,274,],
  [168,166,272,],
  [270,168,272,],
  [170,168,270,],
  [268,170,270,],
  [172,170,268,],
  [266,172,268,],
  [174,172,266,],
  [264,174,266,],
  [176,174,264,],
  [262,176,264,],
  [178,176,262,],
  [97,349,95,],
  [347,349,97,],
  [99,347,97,],
  [345,347,99,],
  [101,345,99,],
  [343,345,101,],
  [103,343,101,],
  [341,343,103,],
  [105,341,103,],
  [339,341,105,],
  [107,339,105,],
  [337,339,107,],
  [109,337,107,],
  [335,337,109,],
  [111,335,109,],
  [333,335,111,],
  [331,333,111,],
  [351,95,349,],
  [93,95,351,],
  [353,93,351,],
  [355,93,353,],
  [91,93,355,],
  [357,91,355,],
  [89,91,357,],
  [359,89,357,],
  [87,89,359,],
  [361,87,359,],
  [85,87,361,],
  [363,85,361,],
  [83,85,363,],
  [365,83,363,],
  [81,83,365,],
  [367,81,365,],
  [79,81,367,],
  [369,79,367,],
  [77,79,369,],
  [371,77,369,],
  [75,77,371,],
  [373,75,371,],
  [73,75,373,],
  [375,73,373,],
  [377,73,375,],
  [71,73,377,],
  [379,71,377,],
  [69,71,379,],
  [381,69,379,],
  [67,69,381,],
  [383,67,381,],
  [65,67,383,],
  [385,65,383,],
  [63,65,385,],
  [387,63,385,],
  [61,63,387,],
  [389,61,387,],
  [59,61,389,],
  [391,59,389,],
  [57,59,391,],
  [393,57,391,],
  [55,57,393,],
  [395,55,393,],
  [397,55,395,],
  [53,55,397,],
  [399,53,397,],
  [51,53,399,],
  [191,51,399,],
  [49,51,191,],
  [193,49,191,],
  [47,49,193,],
  [195,47,193,],
  [45,47,195,],
  [197,45,195,],
  [43,45,197,],
  [199,43,197,],
  [41,43,199,],
  [201,41,199,],
  [39,41,201,],
  [203,39,201,],
  [37,39,203,],
  [205,37,203,],
  [35,37,205,],
  [207,35,205,],
  [209,35,207,],
  [33,35,209,],
  [211,33,209,],
  [31,33,211,],
  [213,31,211,],
  [29,31,213,],
  [215,29,213,],
  [27,29,215,],
  [217,27,215,],
  [25,27,217,],
  [219,25,217,],
  [23,25,219,],
  [221,23,219,],
  [21,23,221,],
  [223,21,221,],
  [19,21,223,],
  [225,19,223,],
  [17,19,225,],
  [227,17,225,],
  [229,17,227,],
  [15,17,229,],
  [231,15,229,],
  [13,15,231,],
  [233,13,231,],
  [11,13,233,],
  [235,11,233,],
  [9,11,235,],
  [237,9,235,],
  [7,9,237,],
  [239,7,237,],
  [5,7,239,],
  [241,5,239,],
  [3,5,241,],
  [243,3,241,],
  [1,3,243,],
  [245,1,243,],
  [189,1,245,],
  [247,189,245,],
  [187,189,247,],
  [249,187,247,],
  [251,187,249,],
  [185,187,251,],
  [253,185,251,],
  [183,185,253,],
  [255,183,253,],
  [181,183,255,],
  [257,181,255,],
  [179,181,257,],
  [259,179,257,],
  [177,179,259,],
  [261,177,259,],
  [175,177,261,],
  [263,175,261,],
  [173,175,263,],
  [265,173,263,],
  [171,173,265,],
  [267,171,265,],
  [169,171,267,],
  [269,169,267,],
  [271,169,269,],
  [167,169,271,],
  [273,167,271,],
  [165,167,273,],
  [275,165,273,],
  [163,165,275,],
  [277,163,275,],
  [161,163,277,],
  [279,161,277,],
  [159,161,279,],
  [281,159,279,],
  [157,159,281,],
  [283,157,281,],
  [155,157,283,],
  [285,155,283,],
  [153,155,285,],
  [287,153,285,],
  [151,153,287,],
  [289,151,287,],
  [149,151,289,],
  [291,149,289,],
  [293,149,291,],
  [147,149,293,],
  [295,147,293,],
  [145,147,295,],
  [297,145,295,],
  [143,145,297,],
  [299,143,297,],
  [141,143,299,],
  [301,141,299,],
  [139,141,301,],
  [303,139,301,],
  [137,139,303,],
  [305,137,303,],
  [135,137,305,],
  [307,135,305,],
  [133,135,307,],
  [309,133,307,],
  [131,133,309,],
  [311,131,309,],
  [313,131,311,],
  [129,131,313,],
  [315,129,313,],
  [127,129,315,],
  [317,127,315,],
  [125,127,317,],
  [319,125,317,],
  [123,125,319,],
  [321,123,319,],
  [121,123,321,],
  [323,121,321,],
  [119,121,323,],
  [325,119,323,],
  [117,119,325,],
  [327,117,325,],
  [115,117,327,],
  [329,115,327,],
  [113,115,329,],
  [331,113,329,],
  [111,113,331,],
 ]);
}
stlObject1_size=[203.1545,3,203.1773];
stlObject1();
